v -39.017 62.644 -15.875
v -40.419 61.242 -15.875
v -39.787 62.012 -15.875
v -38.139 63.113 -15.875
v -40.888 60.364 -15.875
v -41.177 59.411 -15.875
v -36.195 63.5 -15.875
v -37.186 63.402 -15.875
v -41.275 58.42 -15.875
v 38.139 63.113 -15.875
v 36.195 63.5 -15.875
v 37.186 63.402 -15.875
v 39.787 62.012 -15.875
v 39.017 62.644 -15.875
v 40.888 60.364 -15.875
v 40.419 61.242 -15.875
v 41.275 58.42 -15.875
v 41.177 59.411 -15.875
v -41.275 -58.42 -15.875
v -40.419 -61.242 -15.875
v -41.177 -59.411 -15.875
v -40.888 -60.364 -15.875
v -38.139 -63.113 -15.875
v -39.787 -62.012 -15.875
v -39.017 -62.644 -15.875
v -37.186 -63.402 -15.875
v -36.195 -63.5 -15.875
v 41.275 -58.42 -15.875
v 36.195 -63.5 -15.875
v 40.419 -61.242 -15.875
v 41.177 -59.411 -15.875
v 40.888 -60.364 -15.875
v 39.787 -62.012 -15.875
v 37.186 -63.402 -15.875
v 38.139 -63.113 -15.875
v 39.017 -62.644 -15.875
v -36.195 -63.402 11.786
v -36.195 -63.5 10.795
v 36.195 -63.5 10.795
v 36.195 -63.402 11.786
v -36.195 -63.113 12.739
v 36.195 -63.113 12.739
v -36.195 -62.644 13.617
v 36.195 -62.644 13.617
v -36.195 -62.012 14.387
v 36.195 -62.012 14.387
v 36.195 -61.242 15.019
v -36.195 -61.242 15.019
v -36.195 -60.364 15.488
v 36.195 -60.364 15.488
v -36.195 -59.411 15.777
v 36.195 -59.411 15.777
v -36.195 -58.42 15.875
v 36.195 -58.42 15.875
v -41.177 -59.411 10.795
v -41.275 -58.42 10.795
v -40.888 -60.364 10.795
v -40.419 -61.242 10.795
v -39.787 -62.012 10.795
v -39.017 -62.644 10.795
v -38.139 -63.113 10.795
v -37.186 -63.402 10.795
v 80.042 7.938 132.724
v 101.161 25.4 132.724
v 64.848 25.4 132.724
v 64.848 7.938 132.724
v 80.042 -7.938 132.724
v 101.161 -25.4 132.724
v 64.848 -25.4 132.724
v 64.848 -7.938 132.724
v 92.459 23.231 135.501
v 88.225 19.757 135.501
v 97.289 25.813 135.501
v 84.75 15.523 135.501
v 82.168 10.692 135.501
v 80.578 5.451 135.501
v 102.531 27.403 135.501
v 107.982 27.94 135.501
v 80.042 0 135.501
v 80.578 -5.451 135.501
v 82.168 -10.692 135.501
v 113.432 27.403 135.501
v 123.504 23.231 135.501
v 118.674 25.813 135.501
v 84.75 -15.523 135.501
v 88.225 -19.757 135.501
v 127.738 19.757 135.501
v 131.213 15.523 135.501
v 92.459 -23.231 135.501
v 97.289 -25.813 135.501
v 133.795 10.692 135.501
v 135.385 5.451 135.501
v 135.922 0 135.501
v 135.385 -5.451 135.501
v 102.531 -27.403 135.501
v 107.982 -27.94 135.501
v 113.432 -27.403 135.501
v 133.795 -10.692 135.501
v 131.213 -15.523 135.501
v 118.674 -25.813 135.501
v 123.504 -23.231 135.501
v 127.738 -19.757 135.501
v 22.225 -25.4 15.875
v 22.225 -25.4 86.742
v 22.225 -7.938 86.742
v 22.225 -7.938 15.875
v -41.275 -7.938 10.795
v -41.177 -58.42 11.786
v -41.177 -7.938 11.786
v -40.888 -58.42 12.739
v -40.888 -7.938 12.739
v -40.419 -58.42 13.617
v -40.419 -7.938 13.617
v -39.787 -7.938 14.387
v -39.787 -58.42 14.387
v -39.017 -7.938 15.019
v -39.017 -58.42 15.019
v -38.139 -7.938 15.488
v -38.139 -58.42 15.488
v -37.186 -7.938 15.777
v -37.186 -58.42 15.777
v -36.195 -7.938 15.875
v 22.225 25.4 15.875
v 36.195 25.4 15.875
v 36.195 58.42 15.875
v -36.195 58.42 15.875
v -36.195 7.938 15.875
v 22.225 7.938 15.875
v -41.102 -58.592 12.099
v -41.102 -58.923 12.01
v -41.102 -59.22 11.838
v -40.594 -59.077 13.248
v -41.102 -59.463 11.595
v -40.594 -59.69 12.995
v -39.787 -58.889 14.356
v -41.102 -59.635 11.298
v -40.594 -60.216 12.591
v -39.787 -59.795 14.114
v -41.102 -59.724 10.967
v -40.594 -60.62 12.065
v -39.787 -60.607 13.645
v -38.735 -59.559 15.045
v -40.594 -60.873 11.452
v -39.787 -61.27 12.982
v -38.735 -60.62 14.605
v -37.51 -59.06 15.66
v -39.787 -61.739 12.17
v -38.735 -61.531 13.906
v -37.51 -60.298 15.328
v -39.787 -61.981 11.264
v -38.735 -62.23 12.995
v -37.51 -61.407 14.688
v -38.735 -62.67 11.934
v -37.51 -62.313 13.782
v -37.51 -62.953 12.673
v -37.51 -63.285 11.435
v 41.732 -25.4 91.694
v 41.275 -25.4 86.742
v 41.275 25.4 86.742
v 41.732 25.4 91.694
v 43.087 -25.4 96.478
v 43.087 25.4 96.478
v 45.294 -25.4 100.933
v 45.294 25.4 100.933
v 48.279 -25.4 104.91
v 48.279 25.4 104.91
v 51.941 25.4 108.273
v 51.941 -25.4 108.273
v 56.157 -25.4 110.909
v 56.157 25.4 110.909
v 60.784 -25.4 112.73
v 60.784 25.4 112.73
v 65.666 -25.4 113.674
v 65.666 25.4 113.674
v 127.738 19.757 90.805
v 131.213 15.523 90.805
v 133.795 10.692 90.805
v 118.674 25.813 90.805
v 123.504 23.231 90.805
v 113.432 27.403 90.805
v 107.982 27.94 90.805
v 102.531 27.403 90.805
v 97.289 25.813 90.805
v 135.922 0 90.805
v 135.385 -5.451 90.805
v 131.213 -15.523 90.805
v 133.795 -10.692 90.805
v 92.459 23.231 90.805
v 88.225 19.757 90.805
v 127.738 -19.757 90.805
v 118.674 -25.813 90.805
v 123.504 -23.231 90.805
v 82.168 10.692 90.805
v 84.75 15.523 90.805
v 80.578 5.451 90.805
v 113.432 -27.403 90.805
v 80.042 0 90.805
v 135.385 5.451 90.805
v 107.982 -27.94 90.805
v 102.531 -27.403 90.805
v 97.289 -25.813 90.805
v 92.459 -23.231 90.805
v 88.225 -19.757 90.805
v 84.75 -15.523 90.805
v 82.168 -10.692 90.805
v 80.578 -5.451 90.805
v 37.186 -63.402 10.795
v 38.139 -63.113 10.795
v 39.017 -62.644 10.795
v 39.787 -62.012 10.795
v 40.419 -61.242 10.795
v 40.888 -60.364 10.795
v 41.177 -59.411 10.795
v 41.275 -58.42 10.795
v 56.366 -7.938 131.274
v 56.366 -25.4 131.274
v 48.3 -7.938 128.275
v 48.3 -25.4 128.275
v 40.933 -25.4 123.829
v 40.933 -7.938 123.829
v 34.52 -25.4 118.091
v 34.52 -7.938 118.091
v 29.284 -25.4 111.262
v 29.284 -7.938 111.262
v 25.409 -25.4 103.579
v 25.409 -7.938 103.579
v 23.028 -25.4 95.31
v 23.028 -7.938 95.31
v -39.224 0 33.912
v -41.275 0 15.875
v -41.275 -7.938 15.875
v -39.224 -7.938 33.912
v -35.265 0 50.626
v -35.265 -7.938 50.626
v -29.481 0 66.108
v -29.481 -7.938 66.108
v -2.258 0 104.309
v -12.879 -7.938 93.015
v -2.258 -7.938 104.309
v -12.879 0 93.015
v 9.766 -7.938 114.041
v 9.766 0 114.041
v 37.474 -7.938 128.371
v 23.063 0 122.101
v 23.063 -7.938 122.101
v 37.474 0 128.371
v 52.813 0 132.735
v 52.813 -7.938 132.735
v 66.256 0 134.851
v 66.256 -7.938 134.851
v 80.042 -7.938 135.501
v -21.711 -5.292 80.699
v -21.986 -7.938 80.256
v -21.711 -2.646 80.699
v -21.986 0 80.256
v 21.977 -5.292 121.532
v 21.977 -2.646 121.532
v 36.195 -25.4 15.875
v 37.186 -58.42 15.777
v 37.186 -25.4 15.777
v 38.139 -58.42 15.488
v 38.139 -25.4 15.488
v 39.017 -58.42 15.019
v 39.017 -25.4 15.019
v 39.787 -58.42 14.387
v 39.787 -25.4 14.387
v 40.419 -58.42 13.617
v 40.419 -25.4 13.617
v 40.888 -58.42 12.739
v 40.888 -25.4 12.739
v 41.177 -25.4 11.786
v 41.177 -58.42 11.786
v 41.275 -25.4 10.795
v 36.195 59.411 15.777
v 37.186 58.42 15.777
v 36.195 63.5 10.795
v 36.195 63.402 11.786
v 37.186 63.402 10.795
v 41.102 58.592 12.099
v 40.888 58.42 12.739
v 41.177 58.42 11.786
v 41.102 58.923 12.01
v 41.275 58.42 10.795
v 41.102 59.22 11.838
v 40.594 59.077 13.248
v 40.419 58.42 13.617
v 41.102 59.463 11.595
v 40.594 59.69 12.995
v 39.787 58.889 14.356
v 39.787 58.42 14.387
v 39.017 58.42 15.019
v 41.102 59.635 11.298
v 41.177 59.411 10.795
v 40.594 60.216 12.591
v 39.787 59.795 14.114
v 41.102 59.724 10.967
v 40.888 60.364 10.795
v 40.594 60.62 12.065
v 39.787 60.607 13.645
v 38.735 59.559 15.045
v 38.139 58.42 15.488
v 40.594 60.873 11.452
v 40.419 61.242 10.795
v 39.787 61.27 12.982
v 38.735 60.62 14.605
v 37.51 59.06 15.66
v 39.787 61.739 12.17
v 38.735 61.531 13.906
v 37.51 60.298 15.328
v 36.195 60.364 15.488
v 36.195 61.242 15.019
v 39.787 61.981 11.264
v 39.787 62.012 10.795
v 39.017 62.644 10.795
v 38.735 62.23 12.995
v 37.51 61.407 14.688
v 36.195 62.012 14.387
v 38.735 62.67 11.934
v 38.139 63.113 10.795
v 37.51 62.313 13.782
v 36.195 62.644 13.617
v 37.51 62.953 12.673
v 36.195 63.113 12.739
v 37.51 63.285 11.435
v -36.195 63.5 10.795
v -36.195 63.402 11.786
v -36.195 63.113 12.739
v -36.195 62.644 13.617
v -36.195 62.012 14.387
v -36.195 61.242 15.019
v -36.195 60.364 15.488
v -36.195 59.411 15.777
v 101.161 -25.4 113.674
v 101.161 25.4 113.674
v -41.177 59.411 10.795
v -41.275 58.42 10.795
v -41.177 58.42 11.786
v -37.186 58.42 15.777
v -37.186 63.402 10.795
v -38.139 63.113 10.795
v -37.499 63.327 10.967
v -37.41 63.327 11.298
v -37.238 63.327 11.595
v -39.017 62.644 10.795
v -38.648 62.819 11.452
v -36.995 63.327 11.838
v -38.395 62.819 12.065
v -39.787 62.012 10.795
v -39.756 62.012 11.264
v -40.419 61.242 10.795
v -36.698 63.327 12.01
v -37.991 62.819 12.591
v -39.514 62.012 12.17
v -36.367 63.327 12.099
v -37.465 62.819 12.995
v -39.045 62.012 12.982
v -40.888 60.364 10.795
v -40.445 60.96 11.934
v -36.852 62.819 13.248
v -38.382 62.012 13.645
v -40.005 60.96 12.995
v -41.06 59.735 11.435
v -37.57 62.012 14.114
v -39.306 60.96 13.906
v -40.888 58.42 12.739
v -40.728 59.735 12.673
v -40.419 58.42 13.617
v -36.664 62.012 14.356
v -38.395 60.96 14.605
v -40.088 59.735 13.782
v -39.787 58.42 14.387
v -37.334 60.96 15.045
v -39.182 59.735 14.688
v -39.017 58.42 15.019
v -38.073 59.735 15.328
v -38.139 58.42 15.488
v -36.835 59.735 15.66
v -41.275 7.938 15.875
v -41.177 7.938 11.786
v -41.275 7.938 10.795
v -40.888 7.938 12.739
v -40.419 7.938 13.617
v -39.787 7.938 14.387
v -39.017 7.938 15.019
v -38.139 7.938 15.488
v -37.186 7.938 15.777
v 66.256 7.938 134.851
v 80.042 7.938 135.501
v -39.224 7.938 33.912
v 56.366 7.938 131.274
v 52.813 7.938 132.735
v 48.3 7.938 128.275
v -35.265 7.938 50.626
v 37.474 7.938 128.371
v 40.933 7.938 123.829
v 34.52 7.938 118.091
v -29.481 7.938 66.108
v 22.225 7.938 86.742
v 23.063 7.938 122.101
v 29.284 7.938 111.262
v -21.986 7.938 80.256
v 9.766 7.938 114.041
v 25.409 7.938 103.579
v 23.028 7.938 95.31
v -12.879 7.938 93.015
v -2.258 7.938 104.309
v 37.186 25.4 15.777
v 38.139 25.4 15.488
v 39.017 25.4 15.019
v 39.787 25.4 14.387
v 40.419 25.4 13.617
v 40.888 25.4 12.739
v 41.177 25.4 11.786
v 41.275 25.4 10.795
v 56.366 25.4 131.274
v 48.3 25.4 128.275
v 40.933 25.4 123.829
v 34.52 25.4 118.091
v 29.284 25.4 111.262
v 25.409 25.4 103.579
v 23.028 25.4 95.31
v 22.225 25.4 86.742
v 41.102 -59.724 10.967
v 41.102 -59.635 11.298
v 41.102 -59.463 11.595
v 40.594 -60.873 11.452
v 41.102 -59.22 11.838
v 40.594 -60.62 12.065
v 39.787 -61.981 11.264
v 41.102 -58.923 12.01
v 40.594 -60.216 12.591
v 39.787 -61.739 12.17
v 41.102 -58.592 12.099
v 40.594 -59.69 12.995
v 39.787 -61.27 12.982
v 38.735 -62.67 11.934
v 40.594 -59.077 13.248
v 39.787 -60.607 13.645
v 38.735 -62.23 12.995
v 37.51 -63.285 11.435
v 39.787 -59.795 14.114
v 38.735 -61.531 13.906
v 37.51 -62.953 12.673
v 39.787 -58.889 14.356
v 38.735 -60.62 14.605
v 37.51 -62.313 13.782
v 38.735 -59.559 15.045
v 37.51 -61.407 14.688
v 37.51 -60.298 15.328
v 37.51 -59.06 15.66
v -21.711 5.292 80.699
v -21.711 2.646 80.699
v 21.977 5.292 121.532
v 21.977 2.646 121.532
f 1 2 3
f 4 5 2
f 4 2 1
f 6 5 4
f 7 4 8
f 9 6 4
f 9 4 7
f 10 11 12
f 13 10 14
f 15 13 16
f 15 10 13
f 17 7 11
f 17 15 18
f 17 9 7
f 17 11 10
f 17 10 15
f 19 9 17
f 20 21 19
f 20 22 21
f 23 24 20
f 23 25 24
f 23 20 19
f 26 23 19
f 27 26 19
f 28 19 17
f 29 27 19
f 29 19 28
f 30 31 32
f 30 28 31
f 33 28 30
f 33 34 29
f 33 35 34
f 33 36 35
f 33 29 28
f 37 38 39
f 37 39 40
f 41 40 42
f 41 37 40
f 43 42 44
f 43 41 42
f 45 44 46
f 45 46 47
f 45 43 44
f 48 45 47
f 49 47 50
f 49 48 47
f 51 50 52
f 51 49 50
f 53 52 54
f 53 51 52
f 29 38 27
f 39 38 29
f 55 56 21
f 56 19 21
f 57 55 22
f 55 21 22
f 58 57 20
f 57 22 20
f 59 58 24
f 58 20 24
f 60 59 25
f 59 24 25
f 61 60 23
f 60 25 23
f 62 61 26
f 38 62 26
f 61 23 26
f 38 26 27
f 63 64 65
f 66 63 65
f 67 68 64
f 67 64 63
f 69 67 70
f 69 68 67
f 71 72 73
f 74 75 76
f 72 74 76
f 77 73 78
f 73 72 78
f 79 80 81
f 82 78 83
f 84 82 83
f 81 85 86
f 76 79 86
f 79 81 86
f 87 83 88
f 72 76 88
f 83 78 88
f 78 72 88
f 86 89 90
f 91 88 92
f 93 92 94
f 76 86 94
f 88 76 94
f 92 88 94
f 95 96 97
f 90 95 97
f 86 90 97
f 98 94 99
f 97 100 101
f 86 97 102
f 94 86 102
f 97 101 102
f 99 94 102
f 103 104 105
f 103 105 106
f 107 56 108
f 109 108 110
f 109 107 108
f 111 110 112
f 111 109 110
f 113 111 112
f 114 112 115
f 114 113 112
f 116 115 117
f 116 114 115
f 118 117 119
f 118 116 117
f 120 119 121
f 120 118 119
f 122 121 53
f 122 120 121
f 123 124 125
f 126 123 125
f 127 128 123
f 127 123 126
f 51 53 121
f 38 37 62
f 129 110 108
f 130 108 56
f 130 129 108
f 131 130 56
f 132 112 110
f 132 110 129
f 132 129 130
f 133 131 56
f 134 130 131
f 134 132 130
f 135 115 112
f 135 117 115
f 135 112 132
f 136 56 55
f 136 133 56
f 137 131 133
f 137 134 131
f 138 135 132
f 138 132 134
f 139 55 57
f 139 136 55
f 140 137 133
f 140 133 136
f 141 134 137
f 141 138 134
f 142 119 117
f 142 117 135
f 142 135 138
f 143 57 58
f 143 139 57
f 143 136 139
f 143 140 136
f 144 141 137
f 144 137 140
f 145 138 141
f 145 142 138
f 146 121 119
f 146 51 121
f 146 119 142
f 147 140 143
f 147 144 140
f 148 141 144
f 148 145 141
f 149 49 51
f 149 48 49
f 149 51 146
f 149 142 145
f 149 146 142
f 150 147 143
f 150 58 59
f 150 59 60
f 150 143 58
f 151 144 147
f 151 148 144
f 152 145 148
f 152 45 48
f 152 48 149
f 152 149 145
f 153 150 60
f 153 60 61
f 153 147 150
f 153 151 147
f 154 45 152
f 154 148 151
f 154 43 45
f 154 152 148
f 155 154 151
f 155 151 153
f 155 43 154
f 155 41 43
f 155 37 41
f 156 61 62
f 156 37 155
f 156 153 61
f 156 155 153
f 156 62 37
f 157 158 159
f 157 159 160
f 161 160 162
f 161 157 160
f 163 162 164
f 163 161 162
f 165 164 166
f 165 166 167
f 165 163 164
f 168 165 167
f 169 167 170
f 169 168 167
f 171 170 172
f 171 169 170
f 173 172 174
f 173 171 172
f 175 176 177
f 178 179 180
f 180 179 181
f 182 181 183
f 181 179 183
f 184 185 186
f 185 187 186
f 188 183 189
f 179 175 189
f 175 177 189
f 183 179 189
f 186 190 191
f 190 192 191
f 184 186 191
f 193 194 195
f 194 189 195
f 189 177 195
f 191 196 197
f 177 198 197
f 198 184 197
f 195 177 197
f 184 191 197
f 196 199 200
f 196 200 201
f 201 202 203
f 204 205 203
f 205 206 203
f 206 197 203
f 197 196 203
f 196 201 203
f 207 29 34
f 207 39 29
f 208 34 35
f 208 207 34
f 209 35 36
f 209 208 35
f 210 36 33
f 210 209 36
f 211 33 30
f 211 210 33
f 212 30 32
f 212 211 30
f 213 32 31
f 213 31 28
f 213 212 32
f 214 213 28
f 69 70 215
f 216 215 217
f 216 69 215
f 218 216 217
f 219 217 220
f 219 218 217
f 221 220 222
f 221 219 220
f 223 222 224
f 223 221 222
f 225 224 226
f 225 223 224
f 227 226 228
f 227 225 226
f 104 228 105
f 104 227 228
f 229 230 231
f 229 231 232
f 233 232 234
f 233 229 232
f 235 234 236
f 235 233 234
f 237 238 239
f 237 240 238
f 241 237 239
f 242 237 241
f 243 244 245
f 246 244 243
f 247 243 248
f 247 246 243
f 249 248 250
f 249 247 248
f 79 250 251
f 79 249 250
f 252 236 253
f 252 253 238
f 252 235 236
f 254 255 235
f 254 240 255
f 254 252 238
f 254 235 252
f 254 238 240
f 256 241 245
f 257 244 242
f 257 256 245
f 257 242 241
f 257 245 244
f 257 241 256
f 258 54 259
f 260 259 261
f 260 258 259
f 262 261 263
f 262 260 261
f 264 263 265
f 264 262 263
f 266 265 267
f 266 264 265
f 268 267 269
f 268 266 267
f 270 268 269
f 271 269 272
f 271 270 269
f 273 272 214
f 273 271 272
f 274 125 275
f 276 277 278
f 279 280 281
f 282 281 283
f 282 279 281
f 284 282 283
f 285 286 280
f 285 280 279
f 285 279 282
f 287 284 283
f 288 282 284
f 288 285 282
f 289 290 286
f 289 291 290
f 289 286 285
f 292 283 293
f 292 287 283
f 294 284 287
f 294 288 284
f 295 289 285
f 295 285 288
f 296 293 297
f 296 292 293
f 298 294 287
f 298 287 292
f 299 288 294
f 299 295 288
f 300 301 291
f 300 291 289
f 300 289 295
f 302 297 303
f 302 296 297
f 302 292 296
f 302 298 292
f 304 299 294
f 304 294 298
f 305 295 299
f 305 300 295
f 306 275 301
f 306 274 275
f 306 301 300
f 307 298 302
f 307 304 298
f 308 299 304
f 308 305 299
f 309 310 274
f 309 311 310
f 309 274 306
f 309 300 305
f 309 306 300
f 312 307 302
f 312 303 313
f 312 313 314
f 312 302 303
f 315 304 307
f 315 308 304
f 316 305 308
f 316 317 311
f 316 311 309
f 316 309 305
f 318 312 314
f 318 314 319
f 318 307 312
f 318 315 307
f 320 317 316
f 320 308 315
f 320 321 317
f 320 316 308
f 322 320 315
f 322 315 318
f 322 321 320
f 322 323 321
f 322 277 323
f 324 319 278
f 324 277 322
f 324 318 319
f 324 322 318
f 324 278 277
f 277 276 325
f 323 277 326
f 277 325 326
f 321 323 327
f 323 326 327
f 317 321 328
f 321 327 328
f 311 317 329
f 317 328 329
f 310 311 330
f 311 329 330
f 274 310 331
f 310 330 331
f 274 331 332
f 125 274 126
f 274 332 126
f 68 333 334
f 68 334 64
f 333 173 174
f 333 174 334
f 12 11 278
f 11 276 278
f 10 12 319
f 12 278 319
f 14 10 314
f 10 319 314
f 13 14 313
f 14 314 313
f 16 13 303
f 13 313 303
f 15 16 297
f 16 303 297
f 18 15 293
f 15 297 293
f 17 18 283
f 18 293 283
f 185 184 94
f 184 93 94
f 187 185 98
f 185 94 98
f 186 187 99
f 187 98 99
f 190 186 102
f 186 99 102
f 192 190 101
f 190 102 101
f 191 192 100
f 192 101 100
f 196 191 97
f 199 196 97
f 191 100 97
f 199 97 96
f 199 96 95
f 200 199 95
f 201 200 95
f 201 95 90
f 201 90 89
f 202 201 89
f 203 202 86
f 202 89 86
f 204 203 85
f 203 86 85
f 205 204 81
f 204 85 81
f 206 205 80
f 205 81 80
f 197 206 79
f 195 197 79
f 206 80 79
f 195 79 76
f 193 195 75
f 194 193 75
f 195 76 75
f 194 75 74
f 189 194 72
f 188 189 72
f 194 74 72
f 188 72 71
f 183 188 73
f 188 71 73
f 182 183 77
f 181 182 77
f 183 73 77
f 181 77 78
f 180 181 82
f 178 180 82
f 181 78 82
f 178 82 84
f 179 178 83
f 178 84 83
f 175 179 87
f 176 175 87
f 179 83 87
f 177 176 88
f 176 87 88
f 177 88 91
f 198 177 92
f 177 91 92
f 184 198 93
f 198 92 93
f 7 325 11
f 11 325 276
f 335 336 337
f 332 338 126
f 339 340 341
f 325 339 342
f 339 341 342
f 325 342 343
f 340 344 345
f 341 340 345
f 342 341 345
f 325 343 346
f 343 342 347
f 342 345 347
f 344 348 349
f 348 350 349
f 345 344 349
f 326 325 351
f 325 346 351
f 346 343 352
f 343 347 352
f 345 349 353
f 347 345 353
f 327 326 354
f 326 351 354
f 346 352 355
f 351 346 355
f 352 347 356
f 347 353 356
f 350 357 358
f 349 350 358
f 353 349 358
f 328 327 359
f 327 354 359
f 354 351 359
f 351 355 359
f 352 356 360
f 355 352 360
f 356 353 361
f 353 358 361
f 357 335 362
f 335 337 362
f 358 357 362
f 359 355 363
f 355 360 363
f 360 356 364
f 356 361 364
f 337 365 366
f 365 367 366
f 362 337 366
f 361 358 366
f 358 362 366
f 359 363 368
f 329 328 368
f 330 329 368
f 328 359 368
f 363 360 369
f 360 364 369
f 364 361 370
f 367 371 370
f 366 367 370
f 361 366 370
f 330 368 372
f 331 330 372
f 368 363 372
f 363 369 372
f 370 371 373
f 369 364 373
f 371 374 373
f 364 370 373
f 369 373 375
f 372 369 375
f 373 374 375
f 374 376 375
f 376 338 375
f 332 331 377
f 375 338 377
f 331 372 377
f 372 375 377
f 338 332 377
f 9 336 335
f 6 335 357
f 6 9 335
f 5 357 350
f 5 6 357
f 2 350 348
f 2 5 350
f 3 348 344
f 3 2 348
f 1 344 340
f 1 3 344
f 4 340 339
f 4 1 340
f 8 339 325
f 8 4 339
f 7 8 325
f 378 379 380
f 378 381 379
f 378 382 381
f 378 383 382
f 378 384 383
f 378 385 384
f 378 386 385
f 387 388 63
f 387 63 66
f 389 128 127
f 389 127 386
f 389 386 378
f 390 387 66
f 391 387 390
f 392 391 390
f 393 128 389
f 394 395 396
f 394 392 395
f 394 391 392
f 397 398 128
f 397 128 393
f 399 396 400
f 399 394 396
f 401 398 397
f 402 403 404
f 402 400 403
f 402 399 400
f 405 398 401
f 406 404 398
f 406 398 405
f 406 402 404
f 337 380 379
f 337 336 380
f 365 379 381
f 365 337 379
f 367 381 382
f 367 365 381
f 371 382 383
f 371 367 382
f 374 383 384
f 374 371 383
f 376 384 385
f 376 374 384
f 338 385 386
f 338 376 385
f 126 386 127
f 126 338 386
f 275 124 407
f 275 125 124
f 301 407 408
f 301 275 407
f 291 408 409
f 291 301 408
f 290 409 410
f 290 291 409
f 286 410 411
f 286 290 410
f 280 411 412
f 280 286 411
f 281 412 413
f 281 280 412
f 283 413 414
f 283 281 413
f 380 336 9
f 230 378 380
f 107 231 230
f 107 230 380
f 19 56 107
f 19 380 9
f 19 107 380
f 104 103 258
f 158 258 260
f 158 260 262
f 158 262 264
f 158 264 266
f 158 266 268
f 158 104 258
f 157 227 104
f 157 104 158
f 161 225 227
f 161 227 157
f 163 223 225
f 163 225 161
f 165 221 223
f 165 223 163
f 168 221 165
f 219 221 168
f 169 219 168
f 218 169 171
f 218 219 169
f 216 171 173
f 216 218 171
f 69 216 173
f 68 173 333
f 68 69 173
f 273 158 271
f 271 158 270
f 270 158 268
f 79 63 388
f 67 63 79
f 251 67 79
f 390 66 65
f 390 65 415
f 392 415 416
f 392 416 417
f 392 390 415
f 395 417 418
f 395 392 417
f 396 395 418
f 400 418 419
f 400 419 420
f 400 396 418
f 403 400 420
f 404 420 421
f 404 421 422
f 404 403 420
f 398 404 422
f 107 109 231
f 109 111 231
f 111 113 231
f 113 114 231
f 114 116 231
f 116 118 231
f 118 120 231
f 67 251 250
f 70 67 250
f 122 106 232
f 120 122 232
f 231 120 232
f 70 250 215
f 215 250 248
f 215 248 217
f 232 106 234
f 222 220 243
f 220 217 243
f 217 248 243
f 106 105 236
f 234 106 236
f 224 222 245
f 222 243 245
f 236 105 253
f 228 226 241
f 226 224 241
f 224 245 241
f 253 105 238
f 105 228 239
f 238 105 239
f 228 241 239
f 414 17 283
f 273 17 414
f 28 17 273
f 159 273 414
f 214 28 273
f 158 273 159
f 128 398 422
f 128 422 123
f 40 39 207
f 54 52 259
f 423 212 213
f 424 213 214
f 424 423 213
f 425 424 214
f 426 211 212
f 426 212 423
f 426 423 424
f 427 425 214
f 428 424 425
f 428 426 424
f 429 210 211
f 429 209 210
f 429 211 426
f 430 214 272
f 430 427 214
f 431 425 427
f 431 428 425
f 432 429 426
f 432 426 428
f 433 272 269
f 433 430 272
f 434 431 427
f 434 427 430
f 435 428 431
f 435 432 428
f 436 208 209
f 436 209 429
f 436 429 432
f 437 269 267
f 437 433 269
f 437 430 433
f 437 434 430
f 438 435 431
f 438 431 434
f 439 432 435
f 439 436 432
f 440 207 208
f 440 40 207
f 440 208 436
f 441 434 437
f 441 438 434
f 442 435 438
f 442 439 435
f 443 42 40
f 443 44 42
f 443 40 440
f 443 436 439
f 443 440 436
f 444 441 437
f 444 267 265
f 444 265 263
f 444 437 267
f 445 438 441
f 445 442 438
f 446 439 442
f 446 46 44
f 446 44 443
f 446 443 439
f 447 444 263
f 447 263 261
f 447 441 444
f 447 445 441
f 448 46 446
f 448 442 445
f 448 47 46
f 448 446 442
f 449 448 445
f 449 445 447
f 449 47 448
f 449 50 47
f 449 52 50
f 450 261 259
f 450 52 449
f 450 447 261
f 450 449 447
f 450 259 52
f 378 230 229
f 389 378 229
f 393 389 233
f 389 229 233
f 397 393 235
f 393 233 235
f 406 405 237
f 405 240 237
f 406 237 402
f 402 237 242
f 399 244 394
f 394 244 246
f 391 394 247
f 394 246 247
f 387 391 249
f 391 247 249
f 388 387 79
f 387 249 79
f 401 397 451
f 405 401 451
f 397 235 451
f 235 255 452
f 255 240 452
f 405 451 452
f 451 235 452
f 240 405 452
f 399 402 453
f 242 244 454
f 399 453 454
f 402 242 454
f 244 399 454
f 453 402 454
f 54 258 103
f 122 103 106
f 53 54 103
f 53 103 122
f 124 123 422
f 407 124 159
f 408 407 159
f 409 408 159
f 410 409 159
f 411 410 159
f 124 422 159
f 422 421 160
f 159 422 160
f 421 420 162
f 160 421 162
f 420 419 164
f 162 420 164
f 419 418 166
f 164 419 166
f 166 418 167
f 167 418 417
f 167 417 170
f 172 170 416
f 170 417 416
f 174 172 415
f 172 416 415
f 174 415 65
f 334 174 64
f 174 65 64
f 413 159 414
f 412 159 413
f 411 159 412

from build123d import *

# Parameters (mm, degrees)
F1_DEPTH = 63.5
F0_W     = 21.1195161537
F0_H     = 19.05
F2_DEPTH = 25.4
F3_DEPTH = 7.9375
F4_R     = 5.08


with BuildPart() as f1:
    # F0 (on Front) → F1 (new body, symmetric)
    with BuildSketch(Plane.XZ):
        Polygon((-41.275, 15.875), (-41.275, -15.875), (41.275, -15.875), (41.275, 15.875), (22.225, 15.875), align=None)
    extrude(amount=F1_DEPTH, both=True)

    # F0 (on Front) → F2 (join, symmetric)
    with BuildSketch(Plane.XZ):
        with BuildLine():
            Line((22.225, 15.875), (41.275, 15.875))
            Line((41.275, 15.875), (41.275, 86.7423946518))
            ThreePointArc((41.275, 86.7423946518), (48.2789813917, 104.9096233849), (65.6656867074, 113.6735513538))
            Line((65.6656867074, 113.6735513538), (80.041568313, 113.6735513538))
            Line((80.041568313, 113.6735513538), (80.041568313, 132.7235513538))
            Line((80.041568313, 132.7235513538), (64.8478281078, 132.7235513538))
            ThreePointArc((64.8478281078, 132.7235513538), (34.5197054828, 118.0911276707), (22.225, 86.7423946518))
            Line((22.225, 86.7423946518), (22.225, 15.875))
        make_face()
        with Locations((90.6013263899, 123.1985513538)):
            Rectangle(F0_W, F0_H)
    extrude(amount=F2_DEPTH, both=True)

    # F0 (on Front) → F3 (join, symmetric)
    with BuildSketch(Plane.XZ):
        with BuildLine():
            add(Edge.make_bspline(
                [(-41.275, 15.875), (-37.022408098, 91.7378515005), (18.0372260511, 135.9204500914), (80.041568313, 135.5005836293)],
                knots=[0, 0, 0, 0, 170.376025326, 170.376025326, 170.376025326, 170.376025326], degree=3))
            Line((-41.275, 15.875), (22.225, 15.875))
            Line((22.225, 15.875), (22.225, 86.7423946518))
            ThreePointArc((22.225, 86.7423946518), (34.5197054828, 118.0911276707), (64.8478281078, 132.7235513538))
            Line((64.8478281078, 132.7235513538), (80.041568313, 132.7235513538))
            Line((80.041568313, 132.7235513538), (80.041568313, 135.5005836293))
        make_face()
    extrude(amount=F3_DEPTH, both=True)

    # F4
    f4_edges = [f1.edges().sort_by_distance(p)[0] for p in [
        (0, -63.5, 15.875),
        (41.275, -63.5, 0),
        (41.275, -44.45, 15.875),
        (-41.275, -35.71875, 15.875),
        (-41.275, -63.5, 0),
        (-41.275, 35.71875, 15.875),
        (-41.275, 63.5, 0),
        (0, 63.5, 15.875),
        (41.275, 44.45, 15.875),
        (41.275, 63.5, 0),
    ]]
    fillet(f4_edges, radius=F4_R)


with BuildPart() as f5:
    # F0 (on Front) → F5 (revolve)
    with BuildSketch(Plane.XZ):
        Polygon((135.921568313, 135.5005836293), (107.981568313, 135.5005836293), (107.981568313, 113.1527918146), (107.981568313, 90.805), (135.921568313, 90.805), align=None)
    revolve(axis=Axis((107.981568313, 0, 113.1527918146), (0, 0, -1)))


solid = Compound([f1.part, f5.part])
